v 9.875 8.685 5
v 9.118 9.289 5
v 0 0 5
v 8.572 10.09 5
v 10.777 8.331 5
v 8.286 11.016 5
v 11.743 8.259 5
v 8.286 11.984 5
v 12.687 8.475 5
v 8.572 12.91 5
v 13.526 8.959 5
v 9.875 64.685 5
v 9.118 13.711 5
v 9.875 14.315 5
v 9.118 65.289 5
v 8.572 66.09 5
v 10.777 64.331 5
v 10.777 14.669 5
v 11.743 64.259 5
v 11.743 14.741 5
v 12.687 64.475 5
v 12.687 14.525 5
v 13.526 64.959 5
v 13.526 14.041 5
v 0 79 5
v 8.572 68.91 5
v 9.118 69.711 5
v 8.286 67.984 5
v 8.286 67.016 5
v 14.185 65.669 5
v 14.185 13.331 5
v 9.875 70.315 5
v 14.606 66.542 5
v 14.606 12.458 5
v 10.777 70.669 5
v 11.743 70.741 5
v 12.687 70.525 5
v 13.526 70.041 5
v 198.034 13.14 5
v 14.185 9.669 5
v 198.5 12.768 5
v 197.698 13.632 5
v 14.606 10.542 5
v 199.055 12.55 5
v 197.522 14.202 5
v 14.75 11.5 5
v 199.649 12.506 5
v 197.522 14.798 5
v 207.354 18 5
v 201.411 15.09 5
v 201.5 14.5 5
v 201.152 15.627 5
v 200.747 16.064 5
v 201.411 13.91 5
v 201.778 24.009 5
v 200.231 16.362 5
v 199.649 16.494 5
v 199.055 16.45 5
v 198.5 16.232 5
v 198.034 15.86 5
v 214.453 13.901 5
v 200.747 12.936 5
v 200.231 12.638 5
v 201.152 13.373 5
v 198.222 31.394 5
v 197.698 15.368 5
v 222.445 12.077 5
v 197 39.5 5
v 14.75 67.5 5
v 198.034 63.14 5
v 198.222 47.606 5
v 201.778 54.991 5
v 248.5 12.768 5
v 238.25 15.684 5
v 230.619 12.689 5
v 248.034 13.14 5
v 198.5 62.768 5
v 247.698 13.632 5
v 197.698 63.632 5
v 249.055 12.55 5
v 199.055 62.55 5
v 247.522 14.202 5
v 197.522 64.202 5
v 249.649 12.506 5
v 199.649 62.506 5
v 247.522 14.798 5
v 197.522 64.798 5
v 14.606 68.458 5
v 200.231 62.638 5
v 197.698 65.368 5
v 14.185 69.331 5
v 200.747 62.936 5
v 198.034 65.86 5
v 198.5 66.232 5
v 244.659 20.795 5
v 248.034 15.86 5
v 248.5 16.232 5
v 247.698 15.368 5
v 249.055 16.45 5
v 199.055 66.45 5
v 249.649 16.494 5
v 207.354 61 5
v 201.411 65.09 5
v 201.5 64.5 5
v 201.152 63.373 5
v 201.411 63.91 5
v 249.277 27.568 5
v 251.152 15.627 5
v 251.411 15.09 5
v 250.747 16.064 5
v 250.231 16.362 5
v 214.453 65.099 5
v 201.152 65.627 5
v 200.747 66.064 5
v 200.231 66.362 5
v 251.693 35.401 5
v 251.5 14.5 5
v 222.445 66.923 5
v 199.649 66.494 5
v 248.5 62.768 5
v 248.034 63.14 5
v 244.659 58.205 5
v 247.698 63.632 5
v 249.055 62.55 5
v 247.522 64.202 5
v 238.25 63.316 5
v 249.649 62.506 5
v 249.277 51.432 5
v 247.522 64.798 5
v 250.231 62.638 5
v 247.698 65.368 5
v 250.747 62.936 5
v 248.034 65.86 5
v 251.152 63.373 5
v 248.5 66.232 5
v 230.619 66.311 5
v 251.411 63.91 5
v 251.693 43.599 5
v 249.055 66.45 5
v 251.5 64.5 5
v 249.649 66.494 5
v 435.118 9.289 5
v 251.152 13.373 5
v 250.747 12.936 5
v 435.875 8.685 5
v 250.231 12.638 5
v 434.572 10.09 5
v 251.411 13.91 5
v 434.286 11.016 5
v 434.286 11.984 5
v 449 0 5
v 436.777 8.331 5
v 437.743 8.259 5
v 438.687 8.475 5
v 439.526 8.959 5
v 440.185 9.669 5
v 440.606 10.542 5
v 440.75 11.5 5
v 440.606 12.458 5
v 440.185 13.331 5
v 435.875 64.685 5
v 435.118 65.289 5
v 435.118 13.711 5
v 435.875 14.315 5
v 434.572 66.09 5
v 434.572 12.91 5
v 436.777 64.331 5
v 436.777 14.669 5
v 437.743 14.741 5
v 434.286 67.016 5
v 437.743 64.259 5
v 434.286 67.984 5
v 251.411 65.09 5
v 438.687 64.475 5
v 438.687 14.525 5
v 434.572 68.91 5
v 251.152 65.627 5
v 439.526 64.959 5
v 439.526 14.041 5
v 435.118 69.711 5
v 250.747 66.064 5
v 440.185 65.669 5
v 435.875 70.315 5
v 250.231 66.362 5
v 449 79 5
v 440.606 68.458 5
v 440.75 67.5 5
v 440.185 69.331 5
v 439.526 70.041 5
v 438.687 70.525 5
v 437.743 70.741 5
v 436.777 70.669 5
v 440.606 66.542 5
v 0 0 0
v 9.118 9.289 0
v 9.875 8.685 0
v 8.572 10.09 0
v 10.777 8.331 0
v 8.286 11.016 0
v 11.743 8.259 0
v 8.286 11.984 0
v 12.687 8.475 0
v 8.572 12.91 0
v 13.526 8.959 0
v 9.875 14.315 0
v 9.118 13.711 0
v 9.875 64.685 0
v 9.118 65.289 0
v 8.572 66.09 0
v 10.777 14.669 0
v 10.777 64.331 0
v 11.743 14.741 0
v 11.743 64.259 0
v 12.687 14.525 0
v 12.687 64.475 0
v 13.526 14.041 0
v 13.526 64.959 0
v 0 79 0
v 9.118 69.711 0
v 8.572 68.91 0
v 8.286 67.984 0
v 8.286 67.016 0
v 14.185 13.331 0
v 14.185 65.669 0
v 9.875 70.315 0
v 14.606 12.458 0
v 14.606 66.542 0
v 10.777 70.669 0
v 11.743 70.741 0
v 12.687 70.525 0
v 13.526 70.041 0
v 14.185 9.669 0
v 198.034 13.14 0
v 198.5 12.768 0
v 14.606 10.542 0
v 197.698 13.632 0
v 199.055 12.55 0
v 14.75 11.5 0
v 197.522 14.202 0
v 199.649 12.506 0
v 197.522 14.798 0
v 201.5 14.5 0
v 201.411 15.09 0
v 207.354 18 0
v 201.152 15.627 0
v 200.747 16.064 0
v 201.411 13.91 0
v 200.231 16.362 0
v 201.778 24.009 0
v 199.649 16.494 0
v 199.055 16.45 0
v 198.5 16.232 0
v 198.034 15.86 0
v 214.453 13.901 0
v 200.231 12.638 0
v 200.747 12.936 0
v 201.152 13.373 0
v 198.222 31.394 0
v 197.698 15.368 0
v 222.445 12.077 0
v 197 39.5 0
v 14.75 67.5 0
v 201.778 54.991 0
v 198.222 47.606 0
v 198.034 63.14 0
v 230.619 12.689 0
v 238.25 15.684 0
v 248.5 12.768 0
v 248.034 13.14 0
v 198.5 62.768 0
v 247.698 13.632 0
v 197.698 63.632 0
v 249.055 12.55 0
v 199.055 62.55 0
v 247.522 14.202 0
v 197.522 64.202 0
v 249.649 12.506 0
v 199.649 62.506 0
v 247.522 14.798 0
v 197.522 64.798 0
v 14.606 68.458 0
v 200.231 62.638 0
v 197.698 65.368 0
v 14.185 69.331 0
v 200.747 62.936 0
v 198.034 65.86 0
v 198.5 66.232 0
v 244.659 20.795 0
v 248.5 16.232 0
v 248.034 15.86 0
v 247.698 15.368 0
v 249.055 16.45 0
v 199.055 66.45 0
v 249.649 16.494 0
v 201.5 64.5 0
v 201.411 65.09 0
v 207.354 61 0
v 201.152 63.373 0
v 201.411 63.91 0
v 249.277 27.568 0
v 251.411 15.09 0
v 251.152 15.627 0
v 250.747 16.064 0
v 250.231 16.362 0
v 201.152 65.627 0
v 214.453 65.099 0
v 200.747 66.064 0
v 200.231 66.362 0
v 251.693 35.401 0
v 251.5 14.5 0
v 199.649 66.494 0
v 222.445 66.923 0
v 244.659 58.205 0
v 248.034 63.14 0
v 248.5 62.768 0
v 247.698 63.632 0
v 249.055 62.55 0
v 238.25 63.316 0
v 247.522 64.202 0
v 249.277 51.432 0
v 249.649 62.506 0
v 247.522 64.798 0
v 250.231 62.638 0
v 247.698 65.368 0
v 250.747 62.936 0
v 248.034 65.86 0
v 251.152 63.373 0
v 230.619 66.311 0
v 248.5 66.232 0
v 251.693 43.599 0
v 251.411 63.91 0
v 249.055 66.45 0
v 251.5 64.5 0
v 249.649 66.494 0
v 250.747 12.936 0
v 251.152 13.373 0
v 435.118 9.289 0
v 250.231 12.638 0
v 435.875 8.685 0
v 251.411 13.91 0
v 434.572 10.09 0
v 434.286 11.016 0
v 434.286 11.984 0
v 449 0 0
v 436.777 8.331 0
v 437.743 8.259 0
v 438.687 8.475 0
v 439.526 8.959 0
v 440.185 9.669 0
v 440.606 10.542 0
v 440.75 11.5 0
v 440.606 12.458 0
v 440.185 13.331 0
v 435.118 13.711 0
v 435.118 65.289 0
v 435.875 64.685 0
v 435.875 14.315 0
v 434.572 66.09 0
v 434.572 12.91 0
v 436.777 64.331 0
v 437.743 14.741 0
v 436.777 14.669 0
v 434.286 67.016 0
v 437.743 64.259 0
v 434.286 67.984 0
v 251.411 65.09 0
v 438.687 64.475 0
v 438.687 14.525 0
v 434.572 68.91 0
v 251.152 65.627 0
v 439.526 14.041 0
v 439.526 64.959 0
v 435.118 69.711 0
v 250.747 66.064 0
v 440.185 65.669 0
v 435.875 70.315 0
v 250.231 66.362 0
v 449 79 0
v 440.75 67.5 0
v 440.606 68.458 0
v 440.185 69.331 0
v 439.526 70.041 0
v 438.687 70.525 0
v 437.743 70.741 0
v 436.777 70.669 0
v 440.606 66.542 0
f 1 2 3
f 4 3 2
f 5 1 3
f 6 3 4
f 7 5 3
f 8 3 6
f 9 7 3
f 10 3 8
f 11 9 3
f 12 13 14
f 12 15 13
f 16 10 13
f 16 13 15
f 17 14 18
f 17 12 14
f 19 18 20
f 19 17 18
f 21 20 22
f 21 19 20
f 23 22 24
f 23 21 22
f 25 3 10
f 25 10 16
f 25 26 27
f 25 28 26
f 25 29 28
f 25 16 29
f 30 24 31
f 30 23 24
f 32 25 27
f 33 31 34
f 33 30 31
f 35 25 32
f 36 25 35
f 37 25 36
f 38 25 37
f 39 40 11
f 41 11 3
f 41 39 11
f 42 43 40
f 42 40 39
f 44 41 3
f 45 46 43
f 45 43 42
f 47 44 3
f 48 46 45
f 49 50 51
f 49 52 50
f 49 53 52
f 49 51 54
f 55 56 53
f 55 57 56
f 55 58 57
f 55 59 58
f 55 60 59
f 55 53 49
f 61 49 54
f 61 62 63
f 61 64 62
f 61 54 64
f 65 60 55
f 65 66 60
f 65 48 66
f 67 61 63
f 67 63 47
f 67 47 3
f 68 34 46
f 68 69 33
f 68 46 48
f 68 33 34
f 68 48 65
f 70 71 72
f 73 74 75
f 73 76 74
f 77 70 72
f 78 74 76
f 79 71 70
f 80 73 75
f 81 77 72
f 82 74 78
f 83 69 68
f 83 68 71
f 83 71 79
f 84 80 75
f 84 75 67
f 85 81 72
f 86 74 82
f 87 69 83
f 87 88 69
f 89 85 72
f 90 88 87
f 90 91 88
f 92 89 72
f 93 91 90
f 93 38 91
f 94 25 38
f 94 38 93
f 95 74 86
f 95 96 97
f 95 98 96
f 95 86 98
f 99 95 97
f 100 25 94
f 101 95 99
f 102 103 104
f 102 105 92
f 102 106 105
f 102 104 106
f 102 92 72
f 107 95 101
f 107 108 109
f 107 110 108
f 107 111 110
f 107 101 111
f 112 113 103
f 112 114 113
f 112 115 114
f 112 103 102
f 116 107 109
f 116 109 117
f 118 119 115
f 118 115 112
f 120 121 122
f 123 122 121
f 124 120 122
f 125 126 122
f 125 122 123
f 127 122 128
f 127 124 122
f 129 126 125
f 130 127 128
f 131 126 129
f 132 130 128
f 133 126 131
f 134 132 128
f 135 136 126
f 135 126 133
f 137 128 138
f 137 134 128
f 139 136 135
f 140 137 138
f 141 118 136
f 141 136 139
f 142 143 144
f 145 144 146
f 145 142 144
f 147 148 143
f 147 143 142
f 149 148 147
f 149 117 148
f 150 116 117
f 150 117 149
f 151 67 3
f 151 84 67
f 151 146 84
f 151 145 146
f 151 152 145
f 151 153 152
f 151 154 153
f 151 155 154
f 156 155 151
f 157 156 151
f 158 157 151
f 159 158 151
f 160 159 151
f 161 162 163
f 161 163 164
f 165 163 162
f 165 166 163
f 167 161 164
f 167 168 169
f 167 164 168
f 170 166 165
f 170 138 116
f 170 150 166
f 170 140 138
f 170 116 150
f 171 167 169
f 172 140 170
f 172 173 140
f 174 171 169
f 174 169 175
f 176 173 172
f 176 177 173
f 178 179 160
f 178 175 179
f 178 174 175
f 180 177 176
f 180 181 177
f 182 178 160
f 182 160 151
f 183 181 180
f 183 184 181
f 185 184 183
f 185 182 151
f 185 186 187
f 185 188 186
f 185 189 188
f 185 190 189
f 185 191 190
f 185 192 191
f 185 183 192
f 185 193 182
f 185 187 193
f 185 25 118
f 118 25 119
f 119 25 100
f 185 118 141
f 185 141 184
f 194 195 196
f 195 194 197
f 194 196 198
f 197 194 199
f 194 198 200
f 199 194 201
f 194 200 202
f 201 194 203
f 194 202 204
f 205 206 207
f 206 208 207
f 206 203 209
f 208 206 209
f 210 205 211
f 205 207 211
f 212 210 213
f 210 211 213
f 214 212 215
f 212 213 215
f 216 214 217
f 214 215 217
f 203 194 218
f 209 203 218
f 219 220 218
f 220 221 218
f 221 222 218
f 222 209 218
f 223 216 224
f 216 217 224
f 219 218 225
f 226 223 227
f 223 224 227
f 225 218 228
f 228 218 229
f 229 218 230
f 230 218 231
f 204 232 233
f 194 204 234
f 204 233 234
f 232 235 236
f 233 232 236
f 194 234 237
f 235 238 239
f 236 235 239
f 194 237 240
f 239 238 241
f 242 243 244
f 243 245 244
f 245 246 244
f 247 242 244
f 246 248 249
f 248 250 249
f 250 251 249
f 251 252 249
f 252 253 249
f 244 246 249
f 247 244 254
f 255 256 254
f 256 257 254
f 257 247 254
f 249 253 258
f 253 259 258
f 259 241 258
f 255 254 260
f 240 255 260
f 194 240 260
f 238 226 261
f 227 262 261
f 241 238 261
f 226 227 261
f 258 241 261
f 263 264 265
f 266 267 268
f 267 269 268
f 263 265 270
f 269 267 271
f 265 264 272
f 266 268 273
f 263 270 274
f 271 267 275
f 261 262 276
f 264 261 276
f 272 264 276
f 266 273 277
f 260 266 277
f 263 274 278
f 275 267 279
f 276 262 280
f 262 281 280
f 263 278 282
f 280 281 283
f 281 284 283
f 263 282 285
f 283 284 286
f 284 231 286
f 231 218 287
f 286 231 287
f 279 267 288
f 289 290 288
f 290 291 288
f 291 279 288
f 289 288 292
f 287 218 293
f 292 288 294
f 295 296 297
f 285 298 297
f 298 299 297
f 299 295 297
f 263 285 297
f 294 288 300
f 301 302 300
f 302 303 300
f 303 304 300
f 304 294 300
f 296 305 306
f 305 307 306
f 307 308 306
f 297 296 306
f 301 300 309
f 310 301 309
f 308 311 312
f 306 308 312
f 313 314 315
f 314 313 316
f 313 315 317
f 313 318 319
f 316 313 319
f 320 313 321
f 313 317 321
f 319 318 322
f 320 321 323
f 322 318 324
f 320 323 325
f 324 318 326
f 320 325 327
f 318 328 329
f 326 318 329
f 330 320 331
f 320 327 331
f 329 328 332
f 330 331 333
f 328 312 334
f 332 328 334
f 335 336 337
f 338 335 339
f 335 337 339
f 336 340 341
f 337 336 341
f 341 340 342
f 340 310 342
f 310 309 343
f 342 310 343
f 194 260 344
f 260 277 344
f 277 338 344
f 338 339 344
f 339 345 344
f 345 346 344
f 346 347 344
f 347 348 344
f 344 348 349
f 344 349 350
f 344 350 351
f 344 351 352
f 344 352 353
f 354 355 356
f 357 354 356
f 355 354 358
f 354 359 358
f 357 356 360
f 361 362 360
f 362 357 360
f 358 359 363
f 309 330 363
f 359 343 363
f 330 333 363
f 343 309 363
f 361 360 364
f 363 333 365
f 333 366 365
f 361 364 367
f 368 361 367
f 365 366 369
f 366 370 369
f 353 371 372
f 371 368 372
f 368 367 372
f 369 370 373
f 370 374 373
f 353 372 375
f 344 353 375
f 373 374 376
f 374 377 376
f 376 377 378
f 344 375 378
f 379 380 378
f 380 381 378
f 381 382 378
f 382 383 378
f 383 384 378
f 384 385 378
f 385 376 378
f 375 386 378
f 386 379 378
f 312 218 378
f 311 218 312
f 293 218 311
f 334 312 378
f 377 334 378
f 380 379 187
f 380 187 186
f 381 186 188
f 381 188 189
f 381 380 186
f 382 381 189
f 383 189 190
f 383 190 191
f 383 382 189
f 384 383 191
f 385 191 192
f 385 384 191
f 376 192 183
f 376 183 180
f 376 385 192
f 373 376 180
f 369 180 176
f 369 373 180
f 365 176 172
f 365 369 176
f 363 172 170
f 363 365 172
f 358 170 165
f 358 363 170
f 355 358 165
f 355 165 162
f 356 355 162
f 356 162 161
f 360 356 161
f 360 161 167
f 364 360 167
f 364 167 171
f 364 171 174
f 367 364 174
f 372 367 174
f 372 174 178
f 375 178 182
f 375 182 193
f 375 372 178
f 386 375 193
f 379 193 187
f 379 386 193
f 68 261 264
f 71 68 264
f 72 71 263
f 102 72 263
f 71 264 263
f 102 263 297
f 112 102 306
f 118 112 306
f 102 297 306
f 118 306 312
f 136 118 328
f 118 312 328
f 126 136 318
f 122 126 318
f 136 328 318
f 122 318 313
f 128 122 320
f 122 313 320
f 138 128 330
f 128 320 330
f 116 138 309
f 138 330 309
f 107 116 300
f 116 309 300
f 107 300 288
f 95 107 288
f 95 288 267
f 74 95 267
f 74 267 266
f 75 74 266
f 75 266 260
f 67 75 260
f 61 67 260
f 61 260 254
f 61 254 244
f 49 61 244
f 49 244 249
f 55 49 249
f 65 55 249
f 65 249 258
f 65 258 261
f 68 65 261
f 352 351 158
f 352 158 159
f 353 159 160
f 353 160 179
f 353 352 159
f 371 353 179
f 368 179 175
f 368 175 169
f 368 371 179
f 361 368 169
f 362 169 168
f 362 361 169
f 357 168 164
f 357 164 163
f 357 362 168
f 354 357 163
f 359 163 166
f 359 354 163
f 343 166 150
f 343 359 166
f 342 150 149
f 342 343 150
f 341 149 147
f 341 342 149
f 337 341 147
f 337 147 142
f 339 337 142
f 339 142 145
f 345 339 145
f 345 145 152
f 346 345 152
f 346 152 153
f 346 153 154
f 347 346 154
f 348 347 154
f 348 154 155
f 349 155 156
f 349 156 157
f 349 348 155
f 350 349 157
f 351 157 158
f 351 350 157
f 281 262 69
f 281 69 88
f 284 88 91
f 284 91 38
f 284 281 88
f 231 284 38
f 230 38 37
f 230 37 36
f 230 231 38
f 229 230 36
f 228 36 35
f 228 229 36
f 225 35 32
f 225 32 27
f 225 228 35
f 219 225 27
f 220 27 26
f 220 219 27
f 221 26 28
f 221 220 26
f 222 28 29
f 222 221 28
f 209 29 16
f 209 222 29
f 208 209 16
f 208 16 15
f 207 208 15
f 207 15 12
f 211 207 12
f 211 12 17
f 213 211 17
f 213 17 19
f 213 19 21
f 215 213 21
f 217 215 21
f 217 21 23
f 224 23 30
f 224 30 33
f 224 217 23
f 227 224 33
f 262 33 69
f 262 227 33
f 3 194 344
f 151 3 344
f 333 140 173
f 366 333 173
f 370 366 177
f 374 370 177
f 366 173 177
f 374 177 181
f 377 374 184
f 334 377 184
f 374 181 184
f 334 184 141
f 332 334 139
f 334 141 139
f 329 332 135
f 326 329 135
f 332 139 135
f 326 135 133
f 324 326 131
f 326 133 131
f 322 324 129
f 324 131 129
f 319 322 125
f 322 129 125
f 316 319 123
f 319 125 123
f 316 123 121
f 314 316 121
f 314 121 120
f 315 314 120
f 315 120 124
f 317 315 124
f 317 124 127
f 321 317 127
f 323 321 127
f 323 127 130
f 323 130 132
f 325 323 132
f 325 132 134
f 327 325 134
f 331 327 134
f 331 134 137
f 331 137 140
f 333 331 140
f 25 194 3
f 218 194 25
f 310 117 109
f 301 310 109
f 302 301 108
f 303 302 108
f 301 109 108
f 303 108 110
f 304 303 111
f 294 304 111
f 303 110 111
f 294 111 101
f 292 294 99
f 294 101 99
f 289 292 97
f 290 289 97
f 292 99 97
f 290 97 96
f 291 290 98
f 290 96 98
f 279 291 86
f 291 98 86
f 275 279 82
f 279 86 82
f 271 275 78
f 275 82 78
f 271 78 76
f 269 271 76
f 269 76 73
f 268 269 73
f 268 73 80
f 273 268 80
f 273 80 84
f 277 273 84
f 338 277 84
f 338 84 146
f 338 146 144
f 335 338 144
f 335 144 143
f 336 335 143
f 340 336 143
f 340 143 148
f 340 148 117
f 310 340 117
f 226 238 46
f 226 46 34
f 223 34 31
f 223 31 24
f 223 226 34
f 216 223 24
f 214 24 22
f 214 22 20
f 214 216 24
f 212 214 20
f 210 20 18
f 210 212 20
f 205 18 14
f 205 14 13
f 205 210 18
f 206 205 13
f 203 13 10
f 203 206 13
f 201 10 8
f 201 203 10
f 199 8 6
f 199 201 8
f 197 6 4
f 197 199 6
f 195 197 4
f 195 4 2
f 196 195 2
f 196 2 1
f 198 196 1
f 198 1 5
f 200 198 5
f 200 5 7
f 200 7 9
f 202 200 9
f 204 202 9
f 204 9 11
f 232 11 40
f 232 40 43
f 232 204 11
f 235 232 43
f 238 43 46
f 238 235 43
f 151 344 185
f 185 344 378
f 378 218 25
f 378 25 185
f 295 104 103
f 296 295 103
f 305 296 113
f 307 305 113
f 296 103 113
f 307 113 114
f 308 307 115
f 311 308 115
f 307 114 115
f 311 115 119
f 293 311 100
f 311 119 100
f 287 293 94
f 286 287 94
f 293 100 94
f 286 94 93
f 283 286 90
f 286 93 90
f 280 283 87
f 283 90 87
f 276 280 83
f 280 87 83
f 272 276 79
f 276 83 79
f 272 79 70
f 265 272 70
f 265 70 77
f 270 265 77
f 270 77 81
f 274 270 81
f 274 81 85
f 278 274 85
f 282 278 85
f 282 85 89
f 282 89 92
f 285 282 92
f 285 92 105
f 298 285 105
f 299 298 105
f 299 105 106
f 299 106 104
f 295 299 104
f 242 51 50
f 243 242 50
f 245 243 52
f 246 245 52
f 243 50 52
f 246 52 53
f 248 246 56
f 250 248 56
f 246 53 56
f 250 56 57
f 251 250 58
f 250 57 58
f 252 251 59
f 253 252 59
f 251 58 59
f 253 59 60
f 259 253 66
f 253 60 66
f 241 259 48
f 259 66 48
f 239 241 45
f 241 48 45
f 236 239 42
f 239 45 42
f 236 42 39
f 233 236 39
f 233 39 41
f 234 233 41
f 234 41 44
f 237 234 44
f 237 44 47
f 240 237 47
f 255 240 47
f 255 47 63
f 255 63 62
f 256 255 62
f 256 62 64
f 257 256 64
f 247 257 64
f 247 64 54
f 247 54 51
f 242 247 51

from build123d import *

# Parameters (mm, degrees)
SKETCH_F_W                   = 449
SKETCH_F_H                   = 79
SKETCH_F_R                   = 3.25
ESTRUSIONE_ESTRUSIONE1_DEPTH = 5
F_4_0_4_DIAMETER_HOLE1_D     = 4
SKETCH5_R                    = 27.5
CUT_EXTRUDE1_DEPTH           = 6


with BuildPart() as part:
    # f → Estrusione-Estrusione1 (new body)
    with BuildSketch(Plane.XY):
        with Locations((224.5, 39.5)):
            Rectangle(SKETCH_F_W, SKETCH_F_H)
        with Locations((11.5, 67.5)):
            Circle(SKETCH_F_R, mode=Mode.SUBTRACT)
        with Locations((437.5, 67.5)):
            Circle(SKETCH_F_R, mode=Mode.SUBTRACT)
        with Locations((11.5, 11.5)):
            Circle(SKETCH_F_R, mode=Mode.SUBTRACT)
        with Locations((437.5, 11.5)):
            Circle(SKETCH_F_R, mode=Mode.SUBTRACT)
    extrude(amount=ESTRUSIONE_ESTRUSIONE1_DEPTH)

    # Ø4.0 (4) Diameter Hole1 (through all)
    with Locations(Plane(origin=(0, 0, 0), x_dir=(-1, 0, 0), z_dir=(0, 0, -1))):
        with Locations((-249.5, 64.5), (-199.5, 64.5), (-249.5, 14.5), (-199.5, 14.5)):
            Hole(F_4_0_4_DIAMETER_HOLE1_D / 2)

    # Sketch5 → Cut-Extrude1 (cut, through all)
    with BuildSketch(Plane(origin=(0, 0, 0), x_dir=(-1, 0, 0), z_dir=(0, 0, -1))):
        with Locations((-224.5, 39.5)):
            Circle(SKETCH5_R)
    extrude(amount=-CUT_EXTRUDE1_DEPTH, mode=Mode.SUBTRACT)


solid = part.part
